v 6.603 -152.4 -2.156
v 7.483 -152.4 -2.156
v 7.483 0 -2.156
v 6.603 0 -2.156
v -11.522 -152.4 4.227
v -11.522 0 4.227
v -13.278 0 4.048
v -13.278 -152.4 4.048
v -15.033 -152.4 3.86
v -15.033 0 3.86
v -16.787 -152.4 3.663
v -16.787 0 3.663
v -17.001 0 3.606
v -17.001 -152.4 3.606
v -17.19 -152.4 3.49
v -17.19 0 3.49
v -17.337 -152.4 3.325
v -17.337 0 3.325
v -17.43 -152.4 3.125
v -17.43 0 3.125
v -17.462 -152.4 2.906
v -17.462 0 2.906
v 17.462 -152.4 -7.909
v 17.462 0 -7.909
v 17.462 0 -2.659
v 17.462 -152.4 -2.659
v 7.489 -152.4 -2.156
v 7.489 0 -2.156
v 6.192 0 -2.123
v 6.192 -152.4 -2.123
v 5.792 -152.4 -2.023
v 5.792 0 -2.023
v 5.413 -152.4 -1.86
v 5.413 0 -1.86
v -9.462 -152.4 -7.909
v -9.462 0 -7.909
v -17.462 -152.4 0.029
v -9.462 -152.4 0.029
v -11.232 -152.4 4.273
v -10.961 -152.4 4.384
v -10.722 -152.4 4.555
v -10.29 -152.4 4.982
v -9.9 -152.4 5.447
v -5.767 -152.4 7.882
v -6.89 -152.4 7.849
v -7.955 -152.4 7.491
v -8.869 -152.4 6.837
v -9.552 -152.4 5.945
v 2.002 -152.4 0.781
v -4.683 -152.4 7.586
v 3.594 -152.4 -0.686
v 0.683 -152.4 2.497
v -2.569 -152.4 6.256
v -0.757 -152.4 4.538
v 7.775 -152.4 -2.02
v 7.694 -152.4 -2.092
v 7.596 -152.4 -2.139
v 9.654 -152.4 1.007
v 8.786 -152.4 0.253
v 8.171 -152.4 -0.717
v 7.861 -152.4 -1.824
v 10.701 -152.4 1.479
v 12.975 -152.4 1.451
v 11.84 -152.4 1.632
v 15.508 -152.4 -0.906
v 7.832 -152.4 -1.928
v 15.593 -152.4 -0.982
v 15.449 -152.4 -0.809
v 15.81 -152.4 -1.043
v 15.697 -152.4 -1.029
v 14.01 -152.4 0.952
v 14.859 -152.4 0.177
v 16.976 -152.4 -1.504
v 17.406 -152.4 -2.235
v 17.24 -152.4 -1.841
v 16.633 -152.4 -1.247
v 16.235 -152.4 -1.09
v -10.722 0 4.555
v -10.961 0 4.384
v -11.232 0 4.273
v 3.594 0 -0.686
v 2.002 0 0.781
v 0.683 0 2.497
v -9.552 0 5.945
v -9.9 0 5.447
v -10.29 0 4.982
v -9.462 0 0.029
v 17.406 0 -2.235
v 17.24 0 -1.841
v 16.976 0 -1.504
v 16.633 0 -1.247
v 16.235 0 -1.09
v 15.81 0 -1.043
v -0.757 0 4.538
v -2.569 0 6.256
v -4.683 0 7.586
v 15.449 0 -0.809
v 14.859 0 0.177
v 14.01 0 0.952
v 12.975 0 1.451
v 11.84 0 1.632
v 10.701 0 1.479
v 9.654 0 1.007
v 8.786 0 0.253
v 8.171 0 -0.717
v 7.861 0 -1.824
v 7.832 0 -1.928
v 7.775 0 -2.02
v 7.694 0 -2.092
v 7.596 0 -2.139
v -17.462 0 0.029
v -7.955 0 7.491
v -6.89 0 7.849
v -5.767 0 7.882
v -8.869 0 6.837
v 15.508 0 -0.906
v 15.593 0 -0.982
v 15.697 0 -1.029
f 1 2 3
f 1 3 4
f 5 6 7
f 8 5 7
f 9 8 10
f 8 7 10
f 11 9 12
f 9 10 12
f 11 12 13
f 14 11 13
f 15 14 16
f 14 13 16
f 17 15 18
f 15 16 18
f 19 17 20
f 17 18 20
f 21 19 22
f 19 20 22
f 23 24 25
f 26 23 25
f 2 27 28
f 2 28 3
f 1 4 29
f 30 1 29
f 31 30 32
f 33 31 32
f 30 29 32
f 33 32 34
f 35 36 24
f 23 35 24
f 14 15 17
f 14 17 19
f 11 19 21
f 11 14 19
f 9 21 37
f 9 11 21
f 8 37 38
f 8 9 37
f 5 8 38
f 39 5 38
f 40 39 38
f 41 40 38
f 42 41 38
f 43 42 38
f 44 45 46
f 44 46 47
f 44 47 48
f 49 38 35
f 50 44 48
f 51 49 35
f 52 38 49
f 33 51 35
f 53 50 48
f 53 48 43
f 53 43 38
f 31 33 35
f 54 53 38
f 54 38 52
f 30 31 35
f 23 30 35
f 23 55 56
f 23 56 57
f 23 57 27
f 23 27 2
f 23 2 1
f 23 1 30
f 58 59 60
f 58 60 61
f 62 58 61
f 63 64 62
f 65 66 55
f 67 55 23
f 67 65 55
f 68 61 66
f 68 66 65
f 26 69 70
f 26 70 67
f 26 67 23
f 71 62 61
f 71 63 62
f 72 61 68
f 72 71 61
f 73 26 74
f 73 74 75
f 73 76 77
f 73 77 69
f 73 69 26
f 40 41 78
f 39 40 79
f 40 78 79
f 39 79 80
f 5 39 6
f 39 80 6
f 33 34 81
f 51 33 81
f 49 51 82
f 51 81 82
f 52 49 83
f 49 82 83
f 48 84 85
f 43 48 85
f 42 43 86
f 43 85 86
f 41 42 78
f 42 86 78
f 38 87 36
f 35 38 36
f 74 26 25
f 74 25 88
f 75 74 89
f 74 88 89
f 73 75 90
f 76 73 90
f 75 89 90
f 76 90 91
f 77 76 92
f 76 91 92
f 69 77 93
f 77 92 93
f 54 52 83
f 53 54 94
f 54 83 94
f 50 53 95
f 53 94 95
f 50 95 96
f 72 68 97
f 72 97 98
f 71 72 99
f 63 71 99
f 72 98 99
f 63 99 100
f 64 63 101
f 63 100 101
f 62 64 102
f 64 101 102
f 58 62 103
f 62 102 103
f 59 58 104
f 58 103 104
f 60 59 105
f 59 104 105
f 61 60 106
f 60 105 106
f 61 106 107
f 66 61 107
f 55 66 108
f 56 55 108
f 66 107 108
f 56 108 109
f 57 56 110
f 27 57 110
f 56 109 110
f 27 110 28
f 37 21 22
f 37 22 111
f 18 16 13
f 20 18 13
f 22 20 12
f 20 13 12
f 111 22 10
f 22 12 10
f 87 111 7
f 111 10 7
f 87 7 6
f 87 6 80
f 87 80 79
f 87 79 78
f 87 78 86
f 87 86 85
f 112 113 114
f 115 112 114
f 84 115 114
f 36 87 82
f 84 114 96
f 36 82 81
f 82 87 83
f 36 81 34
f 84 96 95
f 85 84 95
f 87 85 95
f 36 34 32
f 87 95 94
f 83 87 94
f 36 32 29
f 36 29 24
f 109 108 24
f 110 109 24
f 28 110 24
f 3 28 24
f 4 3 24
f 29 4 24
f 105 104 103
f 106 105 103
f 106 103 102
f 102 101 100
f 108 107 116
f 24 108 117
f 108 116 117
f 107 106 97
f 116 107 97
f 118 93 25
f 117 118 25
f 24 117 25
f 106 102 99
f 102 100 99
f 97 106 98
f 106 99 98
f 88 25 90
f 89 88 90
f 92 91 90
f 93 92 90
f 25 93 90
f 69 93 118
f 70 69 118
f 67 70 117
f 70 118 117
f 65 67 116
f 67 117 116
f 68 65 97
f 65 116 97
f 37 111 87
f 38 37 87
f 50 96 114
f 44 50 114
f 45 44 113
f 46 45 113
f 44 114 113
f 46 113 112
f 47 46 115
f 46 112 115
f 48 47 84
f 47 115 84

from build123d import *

# Parameters (mm, degrees)
F1_DEPTH = 152.4


# Not quite as in the source:
# - ends of sketch curves that miss each other by under 0.0002 mm in the source are joined


with BuildPart() as f1:
    # F0 (on Front) → F1 (new body)
    with BuildSketch(Plane.XZ):
        with BuildLine():
            Line((-9.4615, 0.028575), (-9.4615, -7.908925))
            Line((-9.4615, -7.908925), (17.4625, -7.908925))
            Line((17.4625, -7.908925), (17.4625, -2.65938))
            ThreePointArc((17.4625, -2.65938), (16.9760741715, -1.5035311682), (15.8095437434, -1.0433101682))
            ThreePointArc((15.8095437434, -1.0433101682), (15.5930919547, -0.9817228233), (15.4491526844, -0.8087322213))
            ThreePointArc((15.4491526844, -0.8087322213), (11.2653307166, 1.5970590296), (7.8607199392, -1.8235935338))
            ThreePointArc((7.8607199392, -1.8235935338), (7.736905149, -2.0587727487), (7.4894692803, -2.1557927219))
            Line((7.4894692803, -2.1557927219), (7.4829161901, -2.1558009151))
            Line((7.4829161901, -2.1558009151), (6.603492, -2.1559774))
            ThreePointArc((6.603492, -2.1559774), (5.9901232061, -2.0809037525), (5.413035163, -1.8599360759))
            ThreePointArc((5.413035163, -1.8599360759), (2.7666336142, 0.0131384296), (0.682874392, 2.4970459891))
            ThreePointArc((0.682874392, 2.4970459891), (-1.6202189431, 5.441919304), (-4.6831053409, 7.585571483))
            ThreePointArc((-4.6831053409, 7.585571483), (-7.435761648, 7.7094554069), (-9.5520790293, 5.9448968563))
            ThreePointArc((-9.5520790293, 5.9448968563), (-10.089729001, 5.2101835463), (-10.7216915696, 4.5548251488))
            ThreePointArc((-10.7216915696, 4.5548251488), (-11.0931160448, 4.3208677831), (-11.52199893, 4.2273251642))
            ThreePointArc((-11.52199893, 4.2273251642), (-14.1558174385, 3.9550500254), (-16.7874935974, 3.6627947922))
            ThreePointArc((-16.7874935974, 3.6627947922), (-17.2692415305, 3.4129116875), (-17.4625, 2.9057854))
            Line((-17.4625, 2.9057854), (-17.4625, 0.028575))
            Line((-17.4625, 0.028575), (-9.4615, 0.028575))
        make_face()
    extrude(amount=F1_DEPTH)


solid = f1.part
